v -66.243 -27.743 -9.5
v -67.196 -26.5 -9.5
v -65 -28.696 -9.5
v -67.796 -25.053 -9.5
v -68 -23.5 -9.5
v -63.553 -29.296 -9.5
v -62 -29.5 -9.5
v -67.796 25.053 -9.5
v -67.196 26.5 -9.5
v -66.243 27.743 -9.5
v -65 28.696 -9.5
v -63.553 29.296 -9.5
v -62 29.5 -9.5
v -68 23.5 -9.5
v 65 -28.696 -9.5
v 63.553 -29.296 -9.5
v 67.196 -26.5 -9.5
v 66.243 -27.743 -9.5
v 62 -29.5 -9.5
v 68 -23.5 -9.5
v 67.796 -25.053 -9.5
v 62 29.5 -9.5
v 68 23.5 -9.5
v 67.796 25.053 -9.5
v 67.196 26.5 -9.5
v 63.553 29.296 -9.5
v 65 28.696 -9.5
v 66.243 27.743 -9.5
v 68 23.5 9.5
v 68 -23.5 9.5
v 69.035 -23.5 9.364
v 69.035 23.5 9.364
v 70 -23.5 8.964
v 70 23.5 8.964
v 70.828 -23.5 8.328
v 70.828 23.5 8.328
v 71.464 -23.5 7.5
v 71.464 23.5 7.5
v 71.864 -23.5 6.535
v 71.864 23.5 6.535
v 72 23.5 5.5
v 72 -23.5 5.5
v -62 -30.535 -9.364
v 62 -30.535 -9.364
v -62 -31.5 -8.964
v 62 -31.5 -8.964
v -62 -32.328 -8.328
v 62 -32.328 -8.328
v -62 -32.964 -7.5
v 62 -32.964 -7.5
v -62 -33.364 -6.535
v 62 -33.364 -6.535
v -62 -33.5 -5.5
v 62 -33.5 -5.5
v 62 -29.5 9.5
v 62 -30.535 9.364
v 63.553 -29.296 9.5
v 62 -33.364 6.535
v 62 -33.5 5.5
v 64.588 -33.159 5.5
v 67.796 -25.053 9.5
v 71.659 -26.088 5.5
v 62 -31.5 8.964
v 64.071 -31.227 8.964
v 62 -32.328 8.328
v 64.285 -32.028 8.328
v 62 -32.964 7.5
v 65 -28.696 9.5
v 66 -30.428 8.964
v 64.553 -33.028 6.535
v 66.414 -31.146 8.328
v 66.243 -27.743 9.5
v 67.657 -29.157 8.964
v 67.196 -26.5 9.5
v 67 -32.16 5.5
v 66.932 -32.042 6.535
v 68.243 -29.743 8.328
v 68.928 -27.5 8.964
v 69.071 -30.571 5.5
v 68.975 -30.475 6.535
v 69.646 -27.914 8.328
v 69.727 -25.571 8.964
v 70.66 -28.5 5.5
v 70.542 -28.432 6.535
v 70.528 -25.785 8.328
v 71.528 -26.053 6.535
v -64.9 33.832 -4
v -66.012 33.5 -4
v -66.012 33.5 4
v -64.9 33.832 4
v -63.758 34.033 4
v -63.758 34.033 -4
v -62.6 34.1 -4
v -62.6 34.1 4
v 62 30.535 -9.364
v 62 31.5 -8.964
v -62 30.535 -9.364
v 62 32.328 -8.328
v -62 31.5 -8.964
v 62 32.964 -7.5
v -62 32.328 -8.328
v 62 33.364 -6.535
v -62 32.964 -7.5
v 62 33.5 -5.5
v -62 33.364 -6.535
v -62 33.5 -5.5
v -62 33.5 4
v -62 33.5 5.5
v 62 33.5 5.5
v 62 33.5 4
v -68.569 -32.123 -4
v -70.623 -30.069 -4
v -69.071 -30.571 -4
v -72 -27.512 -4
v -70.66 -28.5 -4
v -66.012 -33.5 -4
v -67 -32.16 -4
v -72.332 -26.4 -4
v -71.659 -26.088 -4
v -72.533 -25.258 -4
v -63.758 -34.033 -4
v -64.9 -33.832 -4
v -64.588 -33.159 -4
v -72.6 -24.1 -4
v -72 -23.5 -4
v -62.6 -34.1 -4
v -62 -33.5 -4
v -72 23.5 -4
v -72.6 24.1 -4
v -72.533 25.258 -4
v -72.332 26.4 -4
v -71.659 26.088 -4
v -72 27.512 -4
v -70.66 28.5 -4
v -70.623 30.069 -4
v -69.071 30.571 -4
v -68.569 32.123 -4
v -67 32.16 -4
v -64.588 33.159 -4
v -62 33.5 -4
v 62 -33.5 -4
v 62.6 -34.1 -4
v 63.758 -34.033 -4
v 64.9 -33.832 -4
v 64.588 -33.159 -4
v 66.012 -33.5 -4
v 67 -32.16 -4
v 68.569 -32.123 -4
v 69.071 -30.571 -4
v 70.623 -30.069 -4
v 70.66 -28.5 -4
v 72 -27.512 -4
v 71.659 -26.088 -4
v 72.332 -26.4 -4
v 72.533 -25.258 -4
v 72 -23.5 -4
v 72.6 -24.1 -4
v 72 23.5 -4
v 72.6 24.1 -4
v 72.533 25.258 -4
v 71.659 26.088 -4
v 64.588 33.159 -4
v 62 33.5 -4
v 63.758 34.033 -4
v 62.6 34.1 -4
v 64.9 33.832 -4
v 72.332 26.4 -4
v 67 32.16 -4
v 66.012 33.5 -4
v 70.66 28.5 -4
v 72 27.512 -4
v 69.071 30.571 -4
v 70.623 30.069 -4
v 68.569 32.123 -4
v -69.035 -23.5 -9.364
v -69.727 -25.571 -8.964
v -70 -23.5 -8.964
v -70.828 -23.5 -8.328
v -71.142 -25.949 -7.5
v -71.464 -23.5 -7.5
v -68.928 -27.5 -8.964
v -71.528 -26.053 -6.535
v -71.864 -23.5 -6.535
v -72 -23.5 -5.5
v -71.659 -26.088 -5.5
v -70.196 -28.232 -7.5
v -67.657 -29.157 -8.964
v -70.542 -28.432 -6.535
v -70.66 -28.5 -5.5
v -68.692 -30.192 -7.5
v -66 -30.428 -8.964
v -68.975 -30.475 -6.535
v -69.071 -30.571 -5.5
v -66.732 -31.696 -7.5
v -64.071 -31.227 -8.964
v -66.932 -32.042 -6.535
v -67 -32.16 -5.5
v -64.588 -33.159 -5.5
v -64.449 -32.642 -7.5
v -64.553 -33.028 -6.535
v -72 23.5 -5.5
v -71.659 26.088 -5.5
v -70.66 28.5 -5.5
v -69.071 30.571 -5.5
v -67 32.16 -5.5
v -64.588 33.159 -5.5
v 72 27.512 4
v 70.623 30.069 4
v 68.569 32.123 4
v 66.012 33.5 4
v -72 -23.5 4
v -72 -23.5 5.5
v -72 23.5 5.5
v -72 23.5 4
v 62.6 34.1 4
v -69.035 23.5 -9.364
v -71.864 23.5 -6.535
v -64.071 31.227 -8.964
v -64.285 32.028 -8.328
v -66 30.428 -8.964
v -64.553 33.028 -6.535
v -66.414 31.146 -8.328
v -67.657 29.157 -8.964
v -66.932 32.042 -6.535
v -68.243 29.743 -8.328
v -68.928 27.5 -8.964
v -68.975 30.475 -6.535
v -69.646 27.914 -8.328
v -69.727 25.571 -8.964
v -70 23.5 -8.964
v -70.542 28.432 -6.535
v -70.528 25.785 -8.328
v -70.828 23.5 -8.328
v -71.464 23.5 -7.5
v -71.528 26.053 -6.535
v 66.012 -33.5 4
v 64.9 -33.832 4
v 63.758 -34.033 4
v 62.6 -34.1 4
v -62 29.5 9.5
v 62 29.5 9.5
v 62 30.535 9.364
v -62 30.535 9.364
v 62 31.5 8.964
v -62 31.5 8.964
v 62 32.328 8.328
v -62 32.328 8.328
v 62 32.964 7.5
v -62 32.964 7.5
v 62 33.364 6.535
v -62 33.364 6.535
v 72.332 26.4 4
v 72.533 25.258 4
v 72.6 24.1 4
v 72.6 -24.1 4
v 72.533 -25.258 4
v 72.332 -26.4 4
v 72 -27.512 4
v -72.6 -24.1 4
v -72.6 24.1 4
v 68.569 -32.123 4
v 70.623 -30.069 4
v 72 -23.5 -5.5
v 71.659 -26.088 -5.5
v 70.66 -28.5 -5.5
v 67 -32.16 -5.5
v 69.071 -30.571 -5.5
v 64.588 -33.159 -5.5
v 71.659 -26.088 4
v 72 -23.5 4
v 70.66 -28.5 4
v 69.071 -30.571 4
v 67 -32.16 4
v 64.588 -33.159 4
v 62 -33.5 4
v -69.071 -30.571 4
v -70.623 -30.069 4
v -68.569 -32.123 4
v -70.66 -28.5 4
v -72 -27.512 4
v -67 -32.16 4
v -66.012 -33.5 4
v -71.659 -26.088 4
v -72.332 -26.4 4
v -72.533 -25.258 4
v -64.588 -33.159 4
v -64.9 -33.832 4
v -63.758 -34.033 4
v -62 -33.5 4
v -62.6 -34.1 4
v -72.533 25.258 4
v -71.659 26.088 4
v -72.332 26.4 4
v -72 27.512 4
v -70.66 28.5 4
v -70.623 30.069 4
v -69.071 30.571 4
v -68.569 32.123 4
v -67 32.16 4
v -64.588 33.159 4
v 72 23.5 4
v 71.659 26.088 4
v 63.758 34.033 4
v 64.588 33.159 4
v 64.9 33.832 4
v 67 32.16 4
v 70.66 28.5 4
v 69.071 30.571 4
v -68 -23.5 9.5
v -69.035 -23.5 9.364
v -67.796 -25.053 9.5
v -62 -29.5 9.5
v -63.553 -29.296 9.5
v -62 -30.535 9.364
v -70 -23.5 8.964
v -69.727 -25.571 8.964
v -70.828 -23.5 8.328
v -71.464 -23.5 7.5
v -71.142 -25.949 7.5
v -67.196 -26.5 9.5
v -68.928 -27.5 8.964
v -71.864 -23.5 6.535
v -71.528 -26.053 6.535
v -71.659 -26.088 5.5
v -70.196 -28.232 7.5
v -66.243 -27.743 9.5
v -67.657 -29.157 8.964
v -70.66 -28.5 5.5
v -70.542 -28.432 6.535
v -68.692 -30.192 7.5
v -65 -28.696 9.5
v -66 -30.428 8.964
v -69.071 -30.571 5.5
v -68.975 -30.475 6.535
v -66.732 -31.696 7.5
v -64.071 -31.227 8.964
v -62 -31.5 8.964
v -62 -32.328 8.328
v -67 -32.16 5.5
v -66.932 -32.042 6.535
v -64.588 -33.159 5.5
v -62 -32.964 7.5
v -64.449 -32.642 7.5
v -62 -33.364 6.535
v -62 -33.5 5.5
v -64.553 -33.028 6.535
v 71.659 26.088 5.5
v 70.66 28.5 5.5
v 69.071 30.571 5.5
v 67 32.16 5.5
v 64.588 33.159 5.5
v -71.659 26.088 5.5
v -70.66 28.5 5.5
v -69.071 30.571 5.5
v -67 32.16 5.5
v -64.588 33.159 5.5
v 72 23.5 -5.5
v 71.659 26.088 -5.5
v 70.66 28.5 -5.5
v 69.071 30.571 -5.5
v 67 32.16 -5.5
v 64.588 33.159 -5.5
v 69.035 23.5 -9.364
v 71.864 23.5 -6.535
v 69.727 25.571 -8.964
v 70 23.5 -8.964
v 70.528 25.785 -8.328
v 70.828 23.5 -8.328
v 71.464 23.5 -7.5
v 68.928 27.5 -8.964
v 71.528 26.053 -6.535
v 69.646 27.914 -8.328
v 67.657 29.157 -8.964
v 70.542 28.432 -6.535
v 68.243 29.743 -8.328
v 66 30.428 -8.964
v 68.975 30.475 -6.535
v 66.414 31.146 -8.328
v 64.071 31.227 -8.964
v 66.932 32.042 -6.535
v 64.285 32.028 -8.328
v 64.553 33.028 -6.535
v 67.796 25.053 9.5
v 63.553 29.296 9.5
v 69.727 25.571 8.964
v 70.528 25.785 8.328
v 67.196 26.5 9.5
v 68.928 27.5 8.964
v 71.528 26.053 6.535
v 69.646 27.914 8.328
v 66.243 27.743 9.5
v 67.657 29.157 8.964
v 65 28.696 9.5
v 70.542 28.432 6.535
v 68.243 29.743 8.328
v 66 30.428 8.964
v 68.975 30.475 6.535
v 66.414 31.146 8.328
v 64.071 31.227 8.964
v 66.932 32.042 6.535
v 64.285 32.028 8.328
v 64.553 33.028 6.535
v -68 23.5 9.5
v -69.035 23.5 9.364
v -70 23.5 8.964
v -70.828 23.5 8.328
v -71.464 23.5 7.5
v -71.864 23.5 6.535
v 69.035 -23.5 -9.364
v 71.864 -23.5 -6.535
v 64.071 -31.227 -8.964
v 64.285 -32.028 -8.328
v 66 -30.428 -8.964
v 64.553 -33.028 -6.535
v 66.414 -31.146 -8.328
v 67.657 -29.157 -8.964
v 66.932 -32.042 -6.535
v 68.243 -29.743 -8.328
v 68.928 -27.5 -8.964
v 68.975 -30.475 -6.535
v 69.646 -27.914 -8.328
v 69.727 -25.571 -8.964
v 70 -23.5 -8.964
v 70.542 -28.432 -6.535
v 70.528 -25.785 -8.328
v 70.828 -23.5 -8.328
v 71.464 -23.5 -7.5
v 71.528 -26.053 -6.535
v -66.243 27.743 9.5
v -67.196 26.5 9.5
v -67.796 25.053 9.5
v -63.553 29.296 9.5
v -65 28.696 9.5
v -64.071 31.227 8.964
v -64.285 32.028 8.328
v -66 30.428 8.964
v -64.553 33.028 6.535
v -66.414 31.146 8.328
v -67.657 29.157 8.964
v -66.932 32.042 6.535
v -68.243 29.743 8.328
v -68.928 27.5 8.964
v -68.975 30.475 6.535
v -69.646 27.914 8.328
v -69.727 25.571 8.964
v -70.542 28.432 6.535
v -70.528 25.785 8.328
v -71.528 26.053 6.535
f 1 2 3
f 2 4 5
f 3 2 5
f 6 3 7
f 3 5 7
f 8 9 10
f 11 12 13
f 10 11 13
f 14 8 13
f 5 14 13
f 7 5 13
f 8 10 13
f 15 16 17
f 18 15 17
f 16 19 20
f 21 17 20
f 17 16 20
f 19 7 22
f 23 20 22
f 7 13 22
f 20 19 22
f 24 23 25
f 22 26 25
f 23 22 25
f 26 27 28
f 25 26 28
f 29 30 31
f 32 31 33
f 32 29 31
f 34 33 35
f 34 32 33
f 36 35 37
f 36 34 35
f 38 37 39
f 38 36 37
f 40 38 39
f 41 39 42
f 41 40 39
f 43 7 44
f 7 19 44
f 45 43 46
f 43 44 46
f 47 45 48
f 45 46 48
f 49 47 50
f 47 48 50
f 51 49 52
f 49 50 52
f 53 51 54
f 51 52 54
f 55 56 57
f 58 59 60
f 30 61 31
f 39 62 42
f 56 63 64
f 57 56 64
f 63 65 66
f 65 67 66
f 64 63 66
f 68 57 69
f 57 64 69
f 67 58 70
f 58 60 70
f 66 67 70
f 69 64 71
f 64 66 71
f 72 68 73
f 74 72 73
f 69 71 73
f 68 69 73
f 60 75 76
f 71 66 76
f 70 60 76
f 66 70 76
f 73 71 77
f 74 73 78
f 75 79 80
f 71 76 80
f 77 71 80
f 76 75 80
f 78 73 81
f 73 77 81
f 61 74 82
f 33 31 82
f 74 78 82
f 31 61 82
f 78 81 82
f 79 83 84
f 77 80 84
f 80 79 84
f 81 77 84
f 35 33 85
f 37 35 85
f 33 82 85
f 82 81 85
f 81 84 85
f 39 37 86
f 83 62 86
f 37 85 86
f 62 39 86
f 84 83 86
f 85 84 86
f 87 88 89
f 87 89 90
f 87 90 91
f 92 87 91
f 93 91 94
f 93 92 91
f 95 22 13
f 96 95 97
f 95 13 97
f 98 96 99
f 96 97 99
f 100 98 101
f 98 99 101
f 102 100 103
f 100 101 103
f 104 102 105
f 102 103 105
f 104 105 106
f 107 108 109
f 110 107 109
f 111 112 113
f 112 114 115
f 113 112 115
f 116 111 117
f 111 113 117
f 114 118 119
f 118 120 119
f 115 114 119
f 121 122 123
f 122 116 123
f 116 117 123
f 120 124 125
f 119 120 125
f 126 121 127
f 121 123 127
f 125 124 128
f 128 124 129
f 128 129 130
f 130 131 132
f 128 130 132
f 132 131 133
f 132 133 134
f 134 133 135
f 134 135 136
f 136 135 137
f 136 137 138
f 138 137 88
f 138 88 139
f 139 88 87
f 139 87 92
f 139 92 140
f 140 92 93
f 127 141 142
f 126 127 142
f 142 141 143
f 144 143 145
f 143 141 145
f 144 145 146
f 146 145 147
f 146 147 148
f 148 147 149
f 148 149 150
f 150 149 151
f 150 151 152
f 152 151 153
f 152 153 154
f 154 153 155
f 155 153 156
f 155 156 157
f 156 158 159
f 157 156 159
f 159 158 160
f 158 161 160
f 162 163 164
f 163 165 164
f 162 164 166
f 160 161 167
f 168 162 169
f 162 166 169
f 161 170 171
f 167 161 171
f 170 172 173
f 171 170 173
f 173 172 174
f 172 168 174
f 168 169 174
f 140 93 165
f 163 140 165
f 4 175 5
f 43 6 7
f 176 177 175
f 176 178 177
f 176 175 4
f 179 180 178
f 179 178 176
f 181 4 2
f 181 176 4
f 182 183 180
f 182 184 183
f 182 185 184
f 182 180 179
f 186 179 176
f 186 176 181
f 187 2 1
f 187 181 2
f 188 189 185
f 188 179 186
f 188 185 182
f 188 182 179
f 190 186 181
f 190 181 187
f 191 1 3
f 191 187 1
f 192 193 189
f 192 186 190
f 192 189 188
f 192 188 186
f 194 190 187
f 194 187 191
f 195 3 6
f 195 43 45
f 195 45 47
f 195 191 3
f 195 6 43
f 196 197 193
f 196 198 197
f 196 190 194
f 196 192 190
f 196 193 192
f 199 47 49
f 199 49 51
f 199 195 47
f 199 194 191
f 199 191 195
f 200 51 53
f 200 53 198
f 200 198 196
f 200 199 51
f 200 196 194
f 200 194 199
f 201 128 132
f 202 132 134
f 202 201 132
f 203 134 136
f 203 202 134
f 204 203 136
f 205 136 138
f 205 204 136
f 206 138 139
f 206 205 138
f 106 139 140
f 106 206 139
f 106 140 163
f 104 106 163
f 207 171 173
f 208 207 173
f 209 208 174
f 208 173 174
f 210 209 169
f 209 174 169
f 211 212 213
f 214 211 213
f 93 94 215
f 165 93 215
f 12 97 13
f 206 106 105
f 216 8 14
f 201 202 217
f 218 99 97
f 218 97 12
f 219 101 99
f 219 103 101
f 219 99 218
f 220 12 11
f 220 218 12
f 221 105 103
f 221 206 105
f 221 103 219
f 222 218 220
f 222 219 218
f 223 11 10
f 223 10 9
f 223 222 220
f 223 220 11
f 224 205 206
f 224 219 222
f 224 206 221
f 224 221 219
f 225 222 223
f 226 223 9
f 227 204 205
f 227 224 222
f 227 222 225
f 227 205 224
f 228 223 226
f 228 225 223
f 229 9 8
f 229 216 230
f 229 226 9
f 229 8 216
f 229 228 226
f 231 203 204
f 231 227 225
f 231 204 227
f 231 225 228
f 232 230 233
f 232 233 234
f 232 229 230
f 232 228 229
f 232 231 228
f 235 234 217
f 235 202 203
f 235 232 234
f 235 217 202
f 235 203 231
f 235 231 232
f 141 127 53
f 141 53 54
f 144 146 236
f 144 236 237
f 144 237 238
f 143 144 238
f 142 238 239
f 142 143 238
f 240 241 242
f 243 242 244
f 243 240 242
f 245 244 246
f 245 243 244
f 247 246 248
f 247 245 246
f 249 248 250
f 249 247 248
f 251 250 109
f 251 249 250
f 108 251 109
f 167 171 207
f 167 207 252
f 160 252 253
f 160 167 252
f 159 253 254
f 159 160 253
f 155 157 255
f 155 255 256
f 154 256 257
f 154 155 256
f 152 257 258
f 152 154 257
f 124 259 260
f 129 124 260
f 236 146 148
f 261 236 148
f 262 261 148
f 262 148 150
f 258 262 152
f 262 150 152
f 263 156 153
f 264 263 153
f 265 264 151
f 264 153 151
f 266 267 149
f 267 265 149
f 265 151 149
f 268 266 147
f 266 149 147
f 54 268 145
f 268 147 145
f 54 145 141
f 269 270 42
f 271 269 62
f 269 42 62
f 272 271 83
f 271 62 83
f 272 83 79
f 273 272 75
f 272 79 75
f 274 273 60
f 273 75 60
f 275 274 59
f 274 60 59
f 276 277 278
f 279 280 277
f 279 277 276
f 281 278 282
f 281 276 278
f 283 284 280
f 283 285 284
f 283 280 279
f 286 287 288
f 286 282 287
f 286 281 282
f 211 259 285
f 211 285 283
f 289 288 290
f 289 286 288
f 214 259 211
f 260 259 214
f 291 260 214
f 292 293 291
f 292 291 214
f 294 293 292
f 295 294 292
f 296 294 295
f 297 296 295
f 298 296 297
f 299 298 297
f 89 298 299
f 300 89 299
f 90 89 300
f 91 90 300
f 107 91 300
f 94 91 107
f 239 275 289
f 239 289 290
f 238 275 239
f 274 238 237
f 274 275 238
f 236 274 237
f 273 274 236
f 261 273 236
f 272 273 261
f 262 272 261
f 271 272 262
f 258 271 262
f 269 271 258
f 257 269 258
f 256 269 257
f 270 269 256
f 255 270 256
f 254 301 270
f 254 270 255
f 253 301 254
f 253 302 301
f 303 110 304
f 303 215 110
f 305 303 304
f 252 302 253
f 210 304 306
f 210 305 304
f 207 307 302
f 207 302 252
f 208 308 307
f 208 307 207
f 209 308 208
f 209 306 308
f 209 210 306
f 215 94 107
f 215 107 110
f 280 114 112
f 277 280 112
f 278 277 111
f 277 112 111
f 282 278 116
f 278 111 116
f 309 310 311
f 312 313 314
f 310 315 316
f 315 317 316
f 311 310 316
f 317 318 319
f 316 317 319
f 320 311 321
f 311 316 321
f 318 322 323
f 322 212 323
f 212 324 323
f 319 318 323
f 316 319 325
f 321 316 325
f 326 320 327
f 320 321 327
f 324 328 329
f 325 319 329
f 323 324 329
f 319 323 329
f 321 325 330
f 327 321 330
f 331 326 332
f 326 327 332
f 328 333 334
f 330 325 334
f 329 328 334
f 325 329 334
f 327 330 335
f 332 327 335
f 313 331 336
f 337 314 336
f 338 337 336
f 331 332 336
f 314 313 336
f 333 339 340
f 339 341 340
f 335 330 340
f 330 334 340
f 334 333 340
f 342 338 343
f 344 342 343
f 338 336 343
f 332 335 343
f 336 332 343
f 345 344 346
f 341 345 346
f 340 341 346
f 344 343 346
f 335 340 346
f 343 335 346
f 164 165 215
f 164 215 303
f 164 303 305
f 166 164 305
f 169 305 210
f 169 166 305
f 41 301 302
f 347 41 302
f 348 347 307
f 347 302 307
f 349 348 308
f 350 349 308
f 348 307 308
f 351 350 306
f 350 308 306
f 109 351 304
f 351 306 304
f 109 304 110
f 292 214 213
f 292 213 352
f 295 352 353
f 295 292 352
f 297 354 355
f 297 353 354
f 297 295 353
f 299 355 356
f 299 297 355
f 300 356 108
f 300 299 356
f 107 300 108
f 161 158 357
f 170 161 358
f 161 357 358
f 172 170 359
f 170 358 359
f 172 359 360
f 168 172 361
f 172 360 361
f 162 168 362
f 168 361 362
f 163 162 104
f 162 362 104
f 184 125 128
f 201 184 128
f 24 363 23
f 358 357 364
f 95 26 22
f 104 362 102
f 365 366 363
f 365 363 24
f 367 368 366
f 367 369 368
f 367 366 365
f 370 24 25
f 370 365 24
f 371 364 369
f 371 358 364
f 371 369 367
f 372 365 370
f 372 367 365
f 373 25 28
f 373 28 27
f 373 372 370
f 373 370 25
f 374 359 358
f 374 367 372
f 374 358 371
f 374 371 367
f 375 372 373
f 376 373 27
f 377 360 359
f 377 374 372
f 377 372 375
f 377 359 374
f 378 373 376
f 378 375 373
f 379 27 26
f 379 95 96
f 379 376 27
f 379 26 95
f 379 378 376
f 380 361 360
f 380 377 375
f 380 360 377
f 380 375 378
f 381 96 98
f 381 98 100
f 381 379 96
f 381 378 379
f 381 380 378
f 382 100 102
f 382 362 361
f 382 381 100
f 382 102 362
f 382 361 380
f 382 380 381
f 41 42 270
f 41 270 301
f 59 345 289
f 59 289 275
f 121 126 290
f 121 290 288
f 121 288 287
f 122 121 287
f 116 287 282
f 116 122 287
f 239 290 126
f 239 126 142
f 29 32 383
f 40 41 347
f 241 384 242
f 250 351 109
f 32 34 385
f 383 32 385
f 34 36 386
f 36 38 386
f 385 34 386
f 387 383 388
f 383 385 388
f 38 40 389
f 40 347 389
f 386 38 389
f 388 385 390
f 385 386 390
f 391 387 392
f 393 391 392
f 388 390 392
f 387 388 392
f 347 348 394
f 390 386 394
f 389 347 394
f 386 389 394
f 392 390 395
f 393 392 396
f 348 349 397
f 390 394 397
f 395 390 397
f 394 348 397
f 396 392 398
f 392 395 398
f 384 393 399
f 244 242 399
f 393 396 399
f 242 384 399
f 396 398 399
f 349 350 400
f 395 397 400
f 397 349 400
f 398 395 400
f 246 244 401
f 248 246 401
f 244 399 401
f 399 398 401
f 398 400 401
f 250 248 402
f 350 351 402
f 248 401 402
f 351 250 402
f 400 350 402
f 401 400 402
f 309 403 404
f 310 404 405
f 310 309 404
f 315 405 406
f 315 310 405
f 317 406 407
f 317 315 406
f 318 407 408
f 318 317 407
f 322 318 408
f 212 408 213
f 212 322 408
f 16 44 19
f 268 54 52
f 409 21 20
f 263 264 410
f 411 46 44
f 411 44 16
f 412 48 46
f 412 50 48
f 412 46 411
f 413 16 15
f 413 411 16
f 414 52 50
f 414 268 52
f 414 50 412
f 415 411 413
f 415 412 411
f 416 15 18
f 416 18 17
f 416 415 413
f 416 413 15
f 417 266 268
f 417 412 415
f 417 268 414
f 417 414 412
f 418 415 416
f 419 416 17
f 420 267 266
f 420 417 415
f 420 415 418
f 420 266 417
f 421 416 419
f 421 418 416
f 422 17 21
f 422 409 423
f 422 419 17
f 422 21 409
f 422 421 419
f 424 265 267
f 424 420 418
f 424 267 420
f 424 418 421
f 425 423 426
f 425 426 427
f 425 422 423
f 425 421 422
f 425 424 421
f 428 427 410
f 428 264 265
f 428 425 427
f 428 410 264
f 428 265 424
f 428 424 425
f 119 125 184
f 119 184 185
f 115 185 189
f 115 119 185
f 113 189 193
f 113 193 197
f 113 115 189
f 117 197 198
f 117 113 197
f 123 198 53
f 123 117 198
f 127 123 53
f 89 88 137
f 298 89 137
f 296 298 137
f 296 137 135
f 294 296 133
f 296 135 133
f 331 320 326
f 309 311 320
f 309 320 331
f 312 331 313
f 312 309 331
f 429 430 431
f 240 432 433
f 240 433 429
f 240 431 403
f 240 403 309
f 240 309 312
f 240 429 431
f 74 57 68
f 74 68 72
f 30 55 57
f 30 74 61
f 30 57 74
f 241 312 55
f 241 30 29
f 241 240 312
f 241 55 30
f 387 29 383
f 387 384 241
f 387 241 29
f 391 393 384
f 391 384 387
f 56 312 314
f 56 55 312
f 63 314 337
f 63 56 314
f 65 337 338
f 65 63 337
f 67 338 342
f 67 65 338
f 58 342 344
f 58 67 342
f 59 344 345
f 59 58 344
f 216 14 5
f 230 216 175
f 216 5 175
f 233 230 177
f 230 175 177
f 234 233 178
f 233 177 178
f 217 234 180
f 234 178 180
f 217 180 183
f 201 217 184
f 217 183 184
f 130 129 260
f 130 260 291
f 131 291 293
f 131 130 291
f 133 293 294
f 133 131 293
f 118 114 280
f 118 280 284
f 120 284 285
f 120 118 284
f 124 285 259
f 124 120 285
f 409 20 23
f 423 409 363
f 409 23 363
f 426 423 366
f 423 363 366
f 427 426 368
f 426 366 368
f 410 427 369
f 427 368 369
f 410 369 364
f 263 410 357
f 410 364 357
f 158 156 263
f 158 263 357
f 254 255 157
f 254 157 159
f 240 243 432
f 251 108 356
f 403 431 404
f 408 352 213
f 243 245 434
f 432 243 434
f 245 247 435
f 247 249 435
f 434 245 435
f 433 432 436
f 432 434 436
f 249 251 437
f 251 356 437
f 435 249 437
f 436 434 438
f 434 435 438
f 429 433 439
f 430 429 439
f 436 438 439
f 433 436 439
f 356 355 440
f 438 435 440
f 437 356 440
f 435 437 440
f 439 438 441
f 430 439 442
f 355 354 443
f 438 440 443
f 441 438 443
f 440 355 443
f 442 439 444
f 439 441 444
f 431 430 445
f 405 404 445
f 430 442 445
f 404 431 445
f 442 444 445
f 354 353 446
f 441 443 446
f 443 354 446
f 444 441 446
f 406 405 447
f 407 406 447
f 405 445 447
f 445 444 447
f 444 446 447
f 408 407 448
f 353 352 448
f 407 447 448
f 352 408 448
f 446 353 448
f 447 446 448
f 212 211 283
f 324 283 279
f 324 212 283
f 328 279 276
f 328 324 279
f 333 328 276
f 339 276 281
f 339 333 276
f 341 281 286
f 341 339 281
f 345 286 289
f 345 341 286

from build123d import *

# Parameters (mm, degrees)
ESQUISSE1_W        = 144
ESQUISSE1_H        = 67
BOSS_EXTRU_1_DEPTH = 9.5
CONG_2_R           = 10
CONG_1_R           = 4
ESQUISSE3_W        = 145.2
ESQUISSE3_H        = 68.2
ESQUISSE3_W_2      = 144
ESQUISSE3_H_2      = 67
BOSS_EXTRU_2_DEPTH = 4
CONG_3_START       = -4
CONG_3_DEPTH       = 8
CONG_3_2_DEPTH     = 8


with BuildPart() as part:
    # Esquisse1 → Boss.-Extru.1 (new, symmetric)
    with BuildSketch(Plane.XY):
        Rectangle(ESQUISSE1_W, ESQUISSE1_H)
    extrude(amount=BOSS_EXTRU_1_DEPTH, both=True)

    # Congé2
    cong_2_edges = [part.edges().sort_by_distance(p)[0] for p in [
        (-72, 33.5, 0),
        (72, 33.5, 0),
        (72, -33.5, 0),
        (-72, -33.5, 0),
    ]]
    fillet(cong_2_edges, radius=CONG_2_R)

    # Congé1
    cong_1_edges = [part.edges().sort_by_distance(p)[0] for p in [
        (0, -33.5, -9.5),
        (0, -33.5, 9.5),
        (-72, 0, -9.5),
        (0, 33.5, -9.5),
        (72, 0, -9.5),
        (69.071067812, 30.571067812, -9.5),
        (69.071067812, -30.571067812, -9.5),
        (-69.071067812, 30.571067812, -9.5),
        (-69.071067812, -30.571067812, -9.5),
        (-72, 0, 9.5),
        (72, 0, 9.5),
        (0, 33.5, 9.5),
        (69.071067812, 30.571067812, 9.5),
        (69.071067812, -30.571067812, 9.5),
        (-69.071067812, 30.571067812, 9.5),
        (-69.071067812, -30.571067812, 9.5),
    ]]
    fillet(cong_1_edges, radius=CONG_1_R)

    # Esquisse3 → Boss.-Extru.2 (add, symmetric)
    with BuildSketch(Plane.XY):
        Rectangle(ESQUISSE3_W, ESQUISSE3_H)
        Rectangle(ESQUISSE3_W_2, ESQUISSE3_H_2, mode=Mode.SUBTRACT)
    extrude(amount=BOSS_EXTRU_2_DEPTH, both=True)

    # Congé3: read off the stored shape, not the designer's step
    # Congé3 outline → Congé3 (cut)
    with BuildSketch(Plane.XY.offset(CONG_3_START)):
        with BuildLine():
            Line((-72.6, 34.1), (-72.6, 24.1))
            ThreePointArc((-72.6, 24.1), (-72.448857802, 25.832050808), (-72, 27.511744422))
            Line((-72, 27.511744422), (-72, 33.5))
            Line((-72, 33.5), (-66.011744422, 33.5))
            ThreePointArc((-66.011744422, 33.5), (-64.332050808, 33.948857802), (-62.6, 34.1))
            Line((-62.6, 34.1), (-72.6, 34.1))
        make_face()
        with BuildLine():
            ThreePointArc((-72, -27.511744422), (-72.448857802, -25.832050808), (-72.6, -24.1))
            Line((-72.6, -24.1), (-72.6, -34.1))
            Line((-72.6, -34.1), (-62.6, -34.1))
            ThreePointArc((-62.6, -34.1), (-64.332050808, -33.948857802), (-66.011744422, -33.5))
            Line((-66.011744422, -33.5), (-72, -33.5))
            Line((-72, -33.5), (-72, -27.511744422))
        make_face()
        with BuildLine():
            Line((72.6, 34.1), (62.6, 34.1))
            ThreePointArc((62.6, 34.1), (64.332050808, 33.948857802), (66.011744422, 33.5))
            Line((66.011744422, 33.5), (72, 33.5))
            Line((72, 33.5), (72, 27.511744422))
            ThreePointArc((72, 27.511744422), (72.448857802, 25.832050808), (72.6, 24.1))
            Line((72.6, 24.1), (72.6, 34.1))
        make_face()
        with BuildLine():
            ThreePointArc((66.011744422, -33.5), (64.332050808, -33.948857802), (62.6, -34.1))
            Line((62.6, -34.1), (72.6, -34.1))
            Line((72.6, -34.1), (72.6, -24.1))
            ThreePointArc((72.6, -24.1), (72.448857802, -25.832050808), (72, -27.511744422))
            Line((72, -27.511744422), (72, -33.5))
            Line((72, -33.5), (66.011744422, -33.5))
        make_face()
    extrude(amount=CONG_3_DEPTH, mode=Mode.SUBTRACT)

    # Cong_3 2 outline → Cong_3 2 (add)
    with BuildSketch(Plane.XY.offset(CONG_3_START)):
        with BuildLine():
            ThreePointArc((-66.011744422, 33.5), (-69.671067812, 31.171067812), (-72, 27.511744422))
            Line((-72, 27.511744422), (-72, 23.5))
            ThreePointArc((-72, 23.5), (-69.071067812, 30.571067812), (-62, 33.5))
            Line((-62, 33.5), (-66.011744422, 33.5))
        make_face()
        with BuildLine():
            Line((-72, -23.5), (-72, -27.511744422))
            ThreePointArc((-72, -27.511744422), (-69.671067812, -31.171067812), (-66.011744422, -33.5))
            Line((-66.011744422, -33.5), (-62, -33.5))
            ThreePointArc((-62, -33.5), (-69.071067812, -30.571067812), (-72, -23.5))
        make_face()
        with BuildLine():
            ThreePointArc((72, 27.511744422), (69.671067812, 31.171067812), (66.011744422, 33.5))
            Line((66.011744422, 33.5), (62, 33.5))
            ThreePointArc((62, 33.5), (69.071067812, 30.571067812), (72, 23.5))
            Line((72, 23.5), (72, 27.511744422))
        make_face()
        with BuildLine():
            Line((62, -33.5), (66.011744422, -33.5))
            ThreePointArc((66.011744422, -33.5), (69.671067812, -31.171067812), (72, -27.511744422))
            Line((72, -27.511744422), (72, -23.5))
            ThreePointArc((72, -23.5), (69.071067812, -30.571067812), (62, -33.5))
        make_face()
    extrude(amount=CONG_3_2_DEPTH)


solid = part.part
